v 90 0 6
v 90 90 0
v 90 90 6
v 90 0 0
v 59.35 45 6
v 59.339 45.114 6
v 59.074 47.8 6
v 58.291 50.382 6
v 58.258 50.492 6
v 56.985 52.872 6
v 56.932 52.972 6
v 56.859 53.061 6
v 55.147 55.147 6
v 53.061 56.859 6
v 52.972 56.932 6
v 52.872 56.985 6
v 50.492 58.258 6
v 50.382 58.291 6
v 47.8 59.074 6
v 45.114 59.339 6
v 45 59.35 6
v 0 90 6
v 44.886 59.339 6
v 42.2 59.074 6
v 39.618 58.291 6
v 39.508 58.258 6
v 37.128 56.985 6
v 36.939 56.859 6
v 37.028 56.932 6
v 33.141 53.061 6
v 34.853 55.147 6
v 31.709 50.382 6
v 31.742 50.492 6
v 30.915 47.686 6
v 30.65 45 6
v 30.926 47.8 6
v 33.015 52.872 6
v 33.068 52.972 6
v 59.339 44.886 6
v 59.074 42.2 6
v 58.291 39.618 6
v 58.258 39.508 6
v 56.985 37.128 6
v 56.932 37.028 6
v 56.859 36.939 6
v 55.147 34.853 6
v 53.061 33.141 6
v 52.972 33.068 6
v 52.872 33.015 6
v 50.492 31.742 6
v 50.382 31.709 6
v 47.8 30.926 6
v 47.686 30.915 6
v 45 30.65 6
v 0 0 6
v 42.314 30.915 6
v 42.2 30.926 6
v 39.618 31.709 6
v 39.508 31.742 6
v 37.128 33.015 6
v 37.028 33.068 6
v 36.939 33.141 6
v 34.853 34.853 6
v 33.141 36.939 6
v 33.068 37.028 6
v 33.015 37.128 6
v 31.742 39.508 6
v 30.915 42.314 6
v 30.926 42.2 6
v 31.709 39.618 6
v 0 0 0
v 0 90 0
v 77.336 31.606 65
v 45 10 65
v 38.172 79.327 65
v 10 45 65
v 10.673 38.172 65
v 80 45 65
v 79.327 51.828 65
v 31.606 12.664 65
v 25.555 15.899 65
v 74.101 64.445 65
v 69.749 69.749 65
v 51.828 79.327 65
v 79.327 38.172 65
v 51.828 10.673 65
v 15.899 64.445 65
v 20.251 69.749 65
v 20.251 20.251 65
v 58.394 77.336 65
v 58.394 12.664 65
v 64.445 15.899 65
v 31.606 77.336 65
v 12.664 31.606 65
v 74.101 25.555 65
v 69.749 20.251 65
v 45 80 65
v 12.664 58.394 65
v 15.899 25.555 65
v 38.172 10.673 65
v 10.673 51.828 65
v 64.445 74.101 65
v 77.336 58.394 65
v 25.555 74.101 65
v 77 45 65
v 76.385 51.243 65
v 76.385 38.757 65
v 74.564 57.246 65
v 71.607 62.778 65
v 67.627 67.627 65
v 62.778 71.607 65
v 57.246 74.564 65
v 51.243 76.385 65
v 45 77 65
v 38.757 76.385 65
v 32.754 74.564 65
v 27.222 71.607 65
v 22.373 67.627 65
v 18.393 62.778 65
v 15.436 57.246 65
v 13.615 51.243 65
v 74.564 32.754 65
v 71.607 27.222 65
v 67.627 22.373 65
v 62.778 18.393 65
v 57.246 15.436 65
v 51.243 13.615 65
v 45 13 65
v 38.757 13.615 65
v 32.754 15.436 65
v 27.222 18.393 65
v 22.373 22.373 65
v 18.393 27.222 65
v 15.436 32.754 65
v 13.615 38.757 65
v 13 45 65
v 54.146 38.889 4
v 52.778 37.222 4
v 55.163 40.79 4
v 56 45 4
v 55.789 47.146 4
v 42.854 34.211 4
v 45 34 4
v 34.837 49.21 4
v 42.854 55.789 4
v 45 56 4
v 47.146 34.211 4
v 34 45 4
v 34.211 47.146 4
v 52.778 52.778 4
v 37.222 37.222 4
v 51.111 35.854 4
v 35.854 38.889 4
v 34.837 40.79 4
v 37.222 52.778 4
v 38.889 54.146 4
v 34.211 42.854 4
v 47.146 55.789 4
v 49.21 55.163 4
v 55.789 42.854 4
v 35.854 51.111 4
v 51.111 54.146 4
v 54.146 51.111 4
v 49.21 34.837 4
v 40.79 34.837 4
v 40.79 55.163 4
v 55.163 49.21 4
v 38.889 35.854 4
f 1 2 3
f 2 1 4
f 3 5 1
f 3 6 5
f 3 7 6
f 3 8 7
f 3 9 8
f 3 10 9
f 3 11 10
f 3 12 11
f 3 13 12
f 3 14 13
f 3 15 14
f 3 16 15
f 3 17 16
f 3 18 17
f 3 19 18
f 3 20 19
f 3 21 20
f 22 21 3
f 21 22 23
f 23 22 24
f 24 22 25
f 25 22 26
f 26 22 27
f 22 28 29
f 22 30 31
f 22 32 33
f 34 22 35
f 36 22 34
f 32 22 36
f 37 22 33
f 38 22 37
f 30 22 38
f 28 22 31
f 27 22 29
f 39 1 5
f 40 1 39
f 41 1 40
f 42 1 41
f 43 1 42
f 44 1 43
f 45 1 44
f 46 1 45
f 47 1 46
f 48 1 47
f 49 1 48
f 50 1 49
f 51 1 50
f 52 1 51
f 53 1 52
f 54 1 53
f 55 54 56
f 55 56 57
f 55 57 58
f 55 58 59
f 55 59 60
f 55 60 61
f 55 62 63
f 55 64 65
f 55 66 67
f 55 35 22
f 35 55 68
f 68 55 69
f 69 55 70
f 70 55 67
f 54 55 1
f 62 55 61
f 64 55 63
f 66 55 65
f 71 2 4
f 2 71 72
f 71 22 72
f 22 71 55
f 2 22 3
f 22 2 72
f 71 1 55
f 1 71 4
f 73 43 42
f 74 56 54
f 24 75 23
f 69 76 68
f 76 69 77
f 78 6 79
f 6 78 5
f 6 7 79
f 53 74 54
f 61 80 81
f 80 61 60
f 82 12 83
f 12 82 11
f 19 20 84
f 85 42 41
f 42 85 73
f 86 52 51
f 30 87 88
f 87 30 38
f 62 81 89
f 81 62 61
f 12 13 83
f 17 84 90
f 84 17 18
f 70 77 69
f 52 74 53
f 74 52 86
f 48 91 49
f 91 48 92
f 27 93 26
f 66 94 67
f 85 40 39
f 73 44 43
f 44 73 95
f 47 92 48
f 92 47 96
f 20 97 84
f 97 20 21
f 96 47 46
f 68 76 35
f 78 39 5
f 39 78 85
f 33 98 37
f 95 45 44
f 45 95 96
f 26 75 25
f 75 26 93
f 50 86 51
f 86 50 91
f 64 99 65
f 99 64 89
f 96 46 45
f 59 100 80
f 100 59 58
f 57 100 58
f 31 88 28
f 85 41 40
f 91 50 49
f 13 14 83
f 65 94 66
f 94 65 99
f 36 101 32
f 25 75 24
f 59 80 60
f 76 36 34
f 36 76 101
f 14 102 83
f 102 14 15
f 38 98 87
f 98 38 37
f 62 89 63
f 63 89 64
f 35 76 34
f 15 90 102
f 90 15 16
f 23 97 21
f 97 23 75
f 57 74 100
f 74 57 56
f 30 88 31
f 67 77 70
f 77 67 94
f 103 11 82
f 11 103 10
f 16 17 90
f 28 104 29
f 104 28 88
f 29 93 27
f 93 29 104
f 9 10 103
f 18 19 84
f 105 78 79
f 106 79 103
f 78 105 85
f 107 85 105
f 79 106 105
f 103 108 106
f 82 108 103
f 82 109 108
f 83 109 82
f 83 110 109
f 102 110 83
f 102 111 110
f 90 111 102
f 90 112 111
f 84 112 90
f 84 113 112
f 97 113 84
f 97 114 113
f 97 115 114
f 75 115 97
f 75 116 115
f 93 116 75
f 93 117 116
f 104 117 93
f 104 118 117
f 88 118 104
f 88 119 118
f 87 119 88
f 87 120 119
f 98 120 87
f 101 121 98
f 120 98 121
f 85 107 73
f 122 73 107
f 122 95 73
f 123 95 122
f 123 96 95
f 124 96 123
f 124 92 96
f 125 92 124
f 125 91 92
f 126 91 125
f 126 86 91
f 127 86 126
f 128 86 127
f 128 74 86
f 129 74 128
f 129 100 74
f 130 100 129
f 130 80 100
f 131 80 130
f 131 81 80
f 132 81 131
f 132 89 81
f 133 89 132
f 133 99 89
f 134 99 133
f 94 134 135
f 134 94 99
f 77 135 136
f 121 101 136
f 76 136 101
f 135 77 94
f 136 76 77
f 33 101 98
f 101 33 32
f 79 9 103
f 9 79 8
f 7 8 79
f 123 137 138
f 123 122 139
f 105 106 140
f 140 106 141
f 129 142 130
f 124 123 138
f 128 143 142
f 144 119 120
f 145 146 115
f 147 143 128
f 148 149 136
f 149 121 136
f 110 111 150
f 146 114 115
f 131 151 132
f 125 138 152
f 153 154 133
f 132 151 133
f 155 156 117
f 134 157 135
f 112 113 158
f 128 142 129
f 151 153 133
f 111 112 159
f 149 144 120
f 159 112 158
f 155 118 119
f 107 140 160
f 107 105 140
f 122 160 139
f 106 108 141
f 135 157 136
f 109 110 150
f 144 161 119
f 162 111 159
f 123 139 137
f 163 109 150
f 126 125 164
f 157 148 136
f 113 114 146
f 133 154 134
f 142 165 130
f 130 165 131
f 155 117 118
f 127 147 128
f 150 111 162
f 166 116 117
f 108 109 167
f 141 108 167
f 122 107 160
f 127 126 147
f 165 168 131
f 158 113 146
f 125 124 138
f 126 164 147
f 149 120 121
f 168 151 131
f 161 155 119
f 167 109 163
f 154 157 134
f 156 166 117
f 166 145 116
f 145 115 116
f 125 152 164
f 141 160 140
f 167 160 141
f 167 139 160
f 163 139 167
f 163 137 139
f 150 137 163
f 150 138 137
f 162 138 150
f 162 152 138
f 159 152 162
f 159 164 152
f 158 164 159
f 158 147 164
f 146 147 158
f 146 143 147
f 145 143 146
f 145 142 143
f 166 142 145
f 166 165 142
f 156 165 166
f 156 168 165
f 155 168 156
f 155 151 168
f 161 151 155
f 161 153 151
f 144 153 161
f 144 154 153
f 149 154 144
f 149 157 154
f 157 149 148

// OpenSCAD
$fn = 32;

// ----------------------------------------------------------------------
// Hopper: funnel with square flange
// ----------------------------------------------------------------------

// --- parameters (mm) ---
fl = 90;                  // flange side, X and Y
fl_t = 6;                 // flange thickness
cone_h = 60;              // cone height above the flange
top_d = 70;               // cone mouth diameter
bot_d = 28;               // cone spout diameter
wall = 3;                 // cone wall thickness

bore_d = bot_d - 2 * wall;  // spout bore diameter
total_h = fl_t + cone_h - 1;  // overall height

difference() {
  union() {
    cube([fl, fl, fl_t]);
    translate([fl / 2, fl / 2, fl_t - 1])
      cylinder(h = cone_h, d1 = bot_d, d2 = top_d);
  }
  translate([fl / 2, fl / 2, fl_t - 2])
    cylinder(h = cone_h + 1, d1 = bore_d, d2 = top_d - 2 * wall);
}
